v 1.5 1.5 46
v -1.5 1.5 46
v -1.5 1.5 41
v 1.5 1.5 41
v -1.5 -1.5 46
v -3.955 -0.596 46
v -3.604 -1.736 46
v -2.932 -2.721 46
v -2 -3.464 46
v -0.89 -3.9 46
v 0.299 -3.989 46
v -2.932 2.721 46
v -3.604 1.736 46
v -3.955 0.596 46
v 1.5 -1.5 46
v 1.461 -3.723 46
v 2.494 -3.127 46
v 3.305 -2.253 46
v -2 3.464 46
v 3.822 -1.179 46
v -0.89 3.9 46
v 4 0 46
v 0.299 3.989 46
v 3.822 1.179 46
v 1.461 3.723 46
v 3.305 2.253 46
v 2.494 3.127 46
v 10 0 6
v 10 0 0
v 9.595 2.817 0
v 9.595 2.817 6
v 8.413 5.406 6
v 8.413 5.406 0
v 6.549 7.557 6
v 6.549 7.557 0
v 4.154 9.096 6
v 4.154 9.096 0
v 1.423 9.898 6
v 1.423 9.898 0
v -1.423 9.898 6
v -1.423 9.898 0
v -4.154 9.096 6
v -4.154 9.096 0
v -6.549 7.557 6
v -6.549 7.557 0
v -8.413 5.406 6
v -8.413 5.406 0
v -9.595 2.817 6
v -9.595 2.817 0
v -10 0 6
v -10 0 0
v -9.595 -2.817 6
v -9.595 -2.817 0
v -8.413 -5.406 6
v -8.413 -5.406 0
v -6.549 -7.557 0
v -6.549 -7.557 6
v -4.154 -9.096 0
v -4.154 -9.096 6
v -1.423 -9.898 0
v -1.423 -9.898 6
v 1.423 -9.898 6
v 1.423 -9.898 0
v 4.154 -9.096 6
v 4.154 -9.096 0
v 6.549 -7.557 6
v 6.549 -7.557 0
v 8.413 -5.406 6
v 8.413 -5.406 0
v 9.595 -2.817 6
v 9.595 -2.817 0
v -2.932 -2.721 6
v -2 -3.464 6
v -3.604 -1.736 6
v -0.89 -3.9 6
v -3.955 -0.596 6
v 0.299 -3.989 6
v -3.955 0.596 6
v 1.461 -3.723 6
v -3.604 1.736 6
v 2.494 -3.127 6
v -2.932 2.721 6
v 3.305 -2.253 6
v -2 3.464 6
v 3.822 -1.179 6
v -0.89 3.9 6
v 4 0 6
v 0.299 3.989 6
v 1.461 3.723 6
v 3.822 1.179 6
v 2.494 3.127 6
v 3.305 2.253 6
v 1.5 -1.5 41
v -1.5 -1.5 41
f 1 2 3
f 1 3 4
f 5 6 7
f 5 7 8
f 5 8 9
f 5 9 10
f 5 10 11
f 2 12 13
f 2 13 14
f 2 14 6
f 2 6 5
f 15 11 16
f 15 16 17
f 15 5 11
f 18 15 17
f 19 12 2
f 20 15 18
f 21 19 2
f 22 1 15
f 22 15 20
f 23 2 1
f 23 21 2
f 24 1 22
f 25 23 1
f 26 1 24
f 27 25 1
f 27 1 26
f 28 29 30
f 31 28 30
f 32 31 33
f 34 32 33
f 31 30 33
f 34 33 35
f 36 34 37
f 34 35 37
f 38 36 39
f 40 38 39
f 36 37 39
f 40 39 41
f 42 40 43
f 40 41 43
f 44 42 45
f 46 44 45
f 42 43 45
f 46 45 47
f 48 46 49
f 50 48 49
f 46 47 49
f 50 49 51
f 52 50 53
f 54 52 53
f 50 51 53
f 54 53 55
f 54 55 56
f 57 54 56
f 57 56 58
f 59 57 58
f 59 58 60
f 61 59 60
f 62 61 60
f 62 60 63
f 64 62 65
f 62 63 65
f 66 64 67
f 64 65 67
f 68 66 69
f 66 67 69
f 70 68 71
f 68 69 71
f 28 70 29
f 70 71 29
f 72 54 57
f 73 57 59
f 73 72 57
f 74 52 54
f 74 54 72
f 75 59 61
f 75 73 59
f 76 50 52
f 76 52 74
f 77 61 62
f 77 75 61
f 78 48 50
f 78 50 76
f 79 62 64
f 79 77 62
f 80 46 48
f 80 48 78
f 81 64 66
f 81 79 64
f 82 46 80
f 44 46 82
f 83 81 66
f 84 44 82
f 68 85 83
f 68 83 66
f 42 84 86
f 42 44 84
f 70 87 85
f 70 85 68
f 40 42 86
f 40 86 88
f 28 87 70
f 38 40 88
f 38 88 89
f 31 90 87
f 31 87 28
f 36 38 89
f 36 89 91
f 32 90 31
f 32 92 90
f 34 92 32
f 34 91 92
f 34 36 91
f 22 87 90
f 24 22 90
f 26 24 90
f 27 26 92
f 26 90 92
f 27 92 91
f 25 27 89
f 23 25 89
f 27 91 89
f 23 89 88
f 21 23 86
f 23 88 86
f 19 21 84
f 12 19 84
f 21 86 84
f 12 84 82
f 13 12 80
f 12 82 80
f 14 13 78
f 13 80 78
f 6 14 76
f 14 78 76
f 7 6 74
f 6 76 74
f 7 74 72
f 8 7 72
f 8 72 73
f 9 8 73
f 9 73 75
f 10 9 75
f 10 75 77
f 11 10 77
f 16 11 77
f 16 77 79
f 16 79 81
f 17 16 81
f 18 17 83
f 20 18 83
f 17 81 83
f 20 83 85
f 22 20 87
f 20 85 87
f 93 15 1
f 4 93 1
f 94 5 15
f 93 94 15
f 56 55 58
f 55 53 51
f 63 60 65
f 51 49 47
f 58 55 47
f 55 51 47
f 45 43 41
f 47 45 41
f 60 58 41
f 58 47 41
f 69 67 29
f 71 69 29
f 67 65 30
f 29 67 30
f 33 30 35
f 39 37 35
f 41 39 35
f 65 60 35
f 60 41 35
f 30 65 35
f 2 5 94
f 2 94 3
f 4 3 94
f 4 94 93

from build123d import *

# Parameters (mm, degrees)
F0_R     = 10
F1_DEPTH = 6
F2_R     = 4
F3_DEPTH = 40
F4_W     = 3
F4_H     = 3
F5_DEPTH = 5


with BuildPart() as f1:
    # F0 (on Top) → F1 (new body)
    with BuildSketch(Plane.XY):
        Circle(F0_R)
    extrude(amount=F1_DEPTH)

    # F2 (on face) → F3 (join)
    with BuildSketch(Plane.XY.offset(6)):
        Circle(F2_R)
    extrude(amount=F3_DEPTH)

    # F4 (on face) → F5 (cut)
    with BuildSketch(Plane.XY.offset(46)):
        Rectangle(F4_W, F4_H)
    extrude(amount=-F5_DEPTH, mode=Mode.SUBTRACT)


solid = f1.part
